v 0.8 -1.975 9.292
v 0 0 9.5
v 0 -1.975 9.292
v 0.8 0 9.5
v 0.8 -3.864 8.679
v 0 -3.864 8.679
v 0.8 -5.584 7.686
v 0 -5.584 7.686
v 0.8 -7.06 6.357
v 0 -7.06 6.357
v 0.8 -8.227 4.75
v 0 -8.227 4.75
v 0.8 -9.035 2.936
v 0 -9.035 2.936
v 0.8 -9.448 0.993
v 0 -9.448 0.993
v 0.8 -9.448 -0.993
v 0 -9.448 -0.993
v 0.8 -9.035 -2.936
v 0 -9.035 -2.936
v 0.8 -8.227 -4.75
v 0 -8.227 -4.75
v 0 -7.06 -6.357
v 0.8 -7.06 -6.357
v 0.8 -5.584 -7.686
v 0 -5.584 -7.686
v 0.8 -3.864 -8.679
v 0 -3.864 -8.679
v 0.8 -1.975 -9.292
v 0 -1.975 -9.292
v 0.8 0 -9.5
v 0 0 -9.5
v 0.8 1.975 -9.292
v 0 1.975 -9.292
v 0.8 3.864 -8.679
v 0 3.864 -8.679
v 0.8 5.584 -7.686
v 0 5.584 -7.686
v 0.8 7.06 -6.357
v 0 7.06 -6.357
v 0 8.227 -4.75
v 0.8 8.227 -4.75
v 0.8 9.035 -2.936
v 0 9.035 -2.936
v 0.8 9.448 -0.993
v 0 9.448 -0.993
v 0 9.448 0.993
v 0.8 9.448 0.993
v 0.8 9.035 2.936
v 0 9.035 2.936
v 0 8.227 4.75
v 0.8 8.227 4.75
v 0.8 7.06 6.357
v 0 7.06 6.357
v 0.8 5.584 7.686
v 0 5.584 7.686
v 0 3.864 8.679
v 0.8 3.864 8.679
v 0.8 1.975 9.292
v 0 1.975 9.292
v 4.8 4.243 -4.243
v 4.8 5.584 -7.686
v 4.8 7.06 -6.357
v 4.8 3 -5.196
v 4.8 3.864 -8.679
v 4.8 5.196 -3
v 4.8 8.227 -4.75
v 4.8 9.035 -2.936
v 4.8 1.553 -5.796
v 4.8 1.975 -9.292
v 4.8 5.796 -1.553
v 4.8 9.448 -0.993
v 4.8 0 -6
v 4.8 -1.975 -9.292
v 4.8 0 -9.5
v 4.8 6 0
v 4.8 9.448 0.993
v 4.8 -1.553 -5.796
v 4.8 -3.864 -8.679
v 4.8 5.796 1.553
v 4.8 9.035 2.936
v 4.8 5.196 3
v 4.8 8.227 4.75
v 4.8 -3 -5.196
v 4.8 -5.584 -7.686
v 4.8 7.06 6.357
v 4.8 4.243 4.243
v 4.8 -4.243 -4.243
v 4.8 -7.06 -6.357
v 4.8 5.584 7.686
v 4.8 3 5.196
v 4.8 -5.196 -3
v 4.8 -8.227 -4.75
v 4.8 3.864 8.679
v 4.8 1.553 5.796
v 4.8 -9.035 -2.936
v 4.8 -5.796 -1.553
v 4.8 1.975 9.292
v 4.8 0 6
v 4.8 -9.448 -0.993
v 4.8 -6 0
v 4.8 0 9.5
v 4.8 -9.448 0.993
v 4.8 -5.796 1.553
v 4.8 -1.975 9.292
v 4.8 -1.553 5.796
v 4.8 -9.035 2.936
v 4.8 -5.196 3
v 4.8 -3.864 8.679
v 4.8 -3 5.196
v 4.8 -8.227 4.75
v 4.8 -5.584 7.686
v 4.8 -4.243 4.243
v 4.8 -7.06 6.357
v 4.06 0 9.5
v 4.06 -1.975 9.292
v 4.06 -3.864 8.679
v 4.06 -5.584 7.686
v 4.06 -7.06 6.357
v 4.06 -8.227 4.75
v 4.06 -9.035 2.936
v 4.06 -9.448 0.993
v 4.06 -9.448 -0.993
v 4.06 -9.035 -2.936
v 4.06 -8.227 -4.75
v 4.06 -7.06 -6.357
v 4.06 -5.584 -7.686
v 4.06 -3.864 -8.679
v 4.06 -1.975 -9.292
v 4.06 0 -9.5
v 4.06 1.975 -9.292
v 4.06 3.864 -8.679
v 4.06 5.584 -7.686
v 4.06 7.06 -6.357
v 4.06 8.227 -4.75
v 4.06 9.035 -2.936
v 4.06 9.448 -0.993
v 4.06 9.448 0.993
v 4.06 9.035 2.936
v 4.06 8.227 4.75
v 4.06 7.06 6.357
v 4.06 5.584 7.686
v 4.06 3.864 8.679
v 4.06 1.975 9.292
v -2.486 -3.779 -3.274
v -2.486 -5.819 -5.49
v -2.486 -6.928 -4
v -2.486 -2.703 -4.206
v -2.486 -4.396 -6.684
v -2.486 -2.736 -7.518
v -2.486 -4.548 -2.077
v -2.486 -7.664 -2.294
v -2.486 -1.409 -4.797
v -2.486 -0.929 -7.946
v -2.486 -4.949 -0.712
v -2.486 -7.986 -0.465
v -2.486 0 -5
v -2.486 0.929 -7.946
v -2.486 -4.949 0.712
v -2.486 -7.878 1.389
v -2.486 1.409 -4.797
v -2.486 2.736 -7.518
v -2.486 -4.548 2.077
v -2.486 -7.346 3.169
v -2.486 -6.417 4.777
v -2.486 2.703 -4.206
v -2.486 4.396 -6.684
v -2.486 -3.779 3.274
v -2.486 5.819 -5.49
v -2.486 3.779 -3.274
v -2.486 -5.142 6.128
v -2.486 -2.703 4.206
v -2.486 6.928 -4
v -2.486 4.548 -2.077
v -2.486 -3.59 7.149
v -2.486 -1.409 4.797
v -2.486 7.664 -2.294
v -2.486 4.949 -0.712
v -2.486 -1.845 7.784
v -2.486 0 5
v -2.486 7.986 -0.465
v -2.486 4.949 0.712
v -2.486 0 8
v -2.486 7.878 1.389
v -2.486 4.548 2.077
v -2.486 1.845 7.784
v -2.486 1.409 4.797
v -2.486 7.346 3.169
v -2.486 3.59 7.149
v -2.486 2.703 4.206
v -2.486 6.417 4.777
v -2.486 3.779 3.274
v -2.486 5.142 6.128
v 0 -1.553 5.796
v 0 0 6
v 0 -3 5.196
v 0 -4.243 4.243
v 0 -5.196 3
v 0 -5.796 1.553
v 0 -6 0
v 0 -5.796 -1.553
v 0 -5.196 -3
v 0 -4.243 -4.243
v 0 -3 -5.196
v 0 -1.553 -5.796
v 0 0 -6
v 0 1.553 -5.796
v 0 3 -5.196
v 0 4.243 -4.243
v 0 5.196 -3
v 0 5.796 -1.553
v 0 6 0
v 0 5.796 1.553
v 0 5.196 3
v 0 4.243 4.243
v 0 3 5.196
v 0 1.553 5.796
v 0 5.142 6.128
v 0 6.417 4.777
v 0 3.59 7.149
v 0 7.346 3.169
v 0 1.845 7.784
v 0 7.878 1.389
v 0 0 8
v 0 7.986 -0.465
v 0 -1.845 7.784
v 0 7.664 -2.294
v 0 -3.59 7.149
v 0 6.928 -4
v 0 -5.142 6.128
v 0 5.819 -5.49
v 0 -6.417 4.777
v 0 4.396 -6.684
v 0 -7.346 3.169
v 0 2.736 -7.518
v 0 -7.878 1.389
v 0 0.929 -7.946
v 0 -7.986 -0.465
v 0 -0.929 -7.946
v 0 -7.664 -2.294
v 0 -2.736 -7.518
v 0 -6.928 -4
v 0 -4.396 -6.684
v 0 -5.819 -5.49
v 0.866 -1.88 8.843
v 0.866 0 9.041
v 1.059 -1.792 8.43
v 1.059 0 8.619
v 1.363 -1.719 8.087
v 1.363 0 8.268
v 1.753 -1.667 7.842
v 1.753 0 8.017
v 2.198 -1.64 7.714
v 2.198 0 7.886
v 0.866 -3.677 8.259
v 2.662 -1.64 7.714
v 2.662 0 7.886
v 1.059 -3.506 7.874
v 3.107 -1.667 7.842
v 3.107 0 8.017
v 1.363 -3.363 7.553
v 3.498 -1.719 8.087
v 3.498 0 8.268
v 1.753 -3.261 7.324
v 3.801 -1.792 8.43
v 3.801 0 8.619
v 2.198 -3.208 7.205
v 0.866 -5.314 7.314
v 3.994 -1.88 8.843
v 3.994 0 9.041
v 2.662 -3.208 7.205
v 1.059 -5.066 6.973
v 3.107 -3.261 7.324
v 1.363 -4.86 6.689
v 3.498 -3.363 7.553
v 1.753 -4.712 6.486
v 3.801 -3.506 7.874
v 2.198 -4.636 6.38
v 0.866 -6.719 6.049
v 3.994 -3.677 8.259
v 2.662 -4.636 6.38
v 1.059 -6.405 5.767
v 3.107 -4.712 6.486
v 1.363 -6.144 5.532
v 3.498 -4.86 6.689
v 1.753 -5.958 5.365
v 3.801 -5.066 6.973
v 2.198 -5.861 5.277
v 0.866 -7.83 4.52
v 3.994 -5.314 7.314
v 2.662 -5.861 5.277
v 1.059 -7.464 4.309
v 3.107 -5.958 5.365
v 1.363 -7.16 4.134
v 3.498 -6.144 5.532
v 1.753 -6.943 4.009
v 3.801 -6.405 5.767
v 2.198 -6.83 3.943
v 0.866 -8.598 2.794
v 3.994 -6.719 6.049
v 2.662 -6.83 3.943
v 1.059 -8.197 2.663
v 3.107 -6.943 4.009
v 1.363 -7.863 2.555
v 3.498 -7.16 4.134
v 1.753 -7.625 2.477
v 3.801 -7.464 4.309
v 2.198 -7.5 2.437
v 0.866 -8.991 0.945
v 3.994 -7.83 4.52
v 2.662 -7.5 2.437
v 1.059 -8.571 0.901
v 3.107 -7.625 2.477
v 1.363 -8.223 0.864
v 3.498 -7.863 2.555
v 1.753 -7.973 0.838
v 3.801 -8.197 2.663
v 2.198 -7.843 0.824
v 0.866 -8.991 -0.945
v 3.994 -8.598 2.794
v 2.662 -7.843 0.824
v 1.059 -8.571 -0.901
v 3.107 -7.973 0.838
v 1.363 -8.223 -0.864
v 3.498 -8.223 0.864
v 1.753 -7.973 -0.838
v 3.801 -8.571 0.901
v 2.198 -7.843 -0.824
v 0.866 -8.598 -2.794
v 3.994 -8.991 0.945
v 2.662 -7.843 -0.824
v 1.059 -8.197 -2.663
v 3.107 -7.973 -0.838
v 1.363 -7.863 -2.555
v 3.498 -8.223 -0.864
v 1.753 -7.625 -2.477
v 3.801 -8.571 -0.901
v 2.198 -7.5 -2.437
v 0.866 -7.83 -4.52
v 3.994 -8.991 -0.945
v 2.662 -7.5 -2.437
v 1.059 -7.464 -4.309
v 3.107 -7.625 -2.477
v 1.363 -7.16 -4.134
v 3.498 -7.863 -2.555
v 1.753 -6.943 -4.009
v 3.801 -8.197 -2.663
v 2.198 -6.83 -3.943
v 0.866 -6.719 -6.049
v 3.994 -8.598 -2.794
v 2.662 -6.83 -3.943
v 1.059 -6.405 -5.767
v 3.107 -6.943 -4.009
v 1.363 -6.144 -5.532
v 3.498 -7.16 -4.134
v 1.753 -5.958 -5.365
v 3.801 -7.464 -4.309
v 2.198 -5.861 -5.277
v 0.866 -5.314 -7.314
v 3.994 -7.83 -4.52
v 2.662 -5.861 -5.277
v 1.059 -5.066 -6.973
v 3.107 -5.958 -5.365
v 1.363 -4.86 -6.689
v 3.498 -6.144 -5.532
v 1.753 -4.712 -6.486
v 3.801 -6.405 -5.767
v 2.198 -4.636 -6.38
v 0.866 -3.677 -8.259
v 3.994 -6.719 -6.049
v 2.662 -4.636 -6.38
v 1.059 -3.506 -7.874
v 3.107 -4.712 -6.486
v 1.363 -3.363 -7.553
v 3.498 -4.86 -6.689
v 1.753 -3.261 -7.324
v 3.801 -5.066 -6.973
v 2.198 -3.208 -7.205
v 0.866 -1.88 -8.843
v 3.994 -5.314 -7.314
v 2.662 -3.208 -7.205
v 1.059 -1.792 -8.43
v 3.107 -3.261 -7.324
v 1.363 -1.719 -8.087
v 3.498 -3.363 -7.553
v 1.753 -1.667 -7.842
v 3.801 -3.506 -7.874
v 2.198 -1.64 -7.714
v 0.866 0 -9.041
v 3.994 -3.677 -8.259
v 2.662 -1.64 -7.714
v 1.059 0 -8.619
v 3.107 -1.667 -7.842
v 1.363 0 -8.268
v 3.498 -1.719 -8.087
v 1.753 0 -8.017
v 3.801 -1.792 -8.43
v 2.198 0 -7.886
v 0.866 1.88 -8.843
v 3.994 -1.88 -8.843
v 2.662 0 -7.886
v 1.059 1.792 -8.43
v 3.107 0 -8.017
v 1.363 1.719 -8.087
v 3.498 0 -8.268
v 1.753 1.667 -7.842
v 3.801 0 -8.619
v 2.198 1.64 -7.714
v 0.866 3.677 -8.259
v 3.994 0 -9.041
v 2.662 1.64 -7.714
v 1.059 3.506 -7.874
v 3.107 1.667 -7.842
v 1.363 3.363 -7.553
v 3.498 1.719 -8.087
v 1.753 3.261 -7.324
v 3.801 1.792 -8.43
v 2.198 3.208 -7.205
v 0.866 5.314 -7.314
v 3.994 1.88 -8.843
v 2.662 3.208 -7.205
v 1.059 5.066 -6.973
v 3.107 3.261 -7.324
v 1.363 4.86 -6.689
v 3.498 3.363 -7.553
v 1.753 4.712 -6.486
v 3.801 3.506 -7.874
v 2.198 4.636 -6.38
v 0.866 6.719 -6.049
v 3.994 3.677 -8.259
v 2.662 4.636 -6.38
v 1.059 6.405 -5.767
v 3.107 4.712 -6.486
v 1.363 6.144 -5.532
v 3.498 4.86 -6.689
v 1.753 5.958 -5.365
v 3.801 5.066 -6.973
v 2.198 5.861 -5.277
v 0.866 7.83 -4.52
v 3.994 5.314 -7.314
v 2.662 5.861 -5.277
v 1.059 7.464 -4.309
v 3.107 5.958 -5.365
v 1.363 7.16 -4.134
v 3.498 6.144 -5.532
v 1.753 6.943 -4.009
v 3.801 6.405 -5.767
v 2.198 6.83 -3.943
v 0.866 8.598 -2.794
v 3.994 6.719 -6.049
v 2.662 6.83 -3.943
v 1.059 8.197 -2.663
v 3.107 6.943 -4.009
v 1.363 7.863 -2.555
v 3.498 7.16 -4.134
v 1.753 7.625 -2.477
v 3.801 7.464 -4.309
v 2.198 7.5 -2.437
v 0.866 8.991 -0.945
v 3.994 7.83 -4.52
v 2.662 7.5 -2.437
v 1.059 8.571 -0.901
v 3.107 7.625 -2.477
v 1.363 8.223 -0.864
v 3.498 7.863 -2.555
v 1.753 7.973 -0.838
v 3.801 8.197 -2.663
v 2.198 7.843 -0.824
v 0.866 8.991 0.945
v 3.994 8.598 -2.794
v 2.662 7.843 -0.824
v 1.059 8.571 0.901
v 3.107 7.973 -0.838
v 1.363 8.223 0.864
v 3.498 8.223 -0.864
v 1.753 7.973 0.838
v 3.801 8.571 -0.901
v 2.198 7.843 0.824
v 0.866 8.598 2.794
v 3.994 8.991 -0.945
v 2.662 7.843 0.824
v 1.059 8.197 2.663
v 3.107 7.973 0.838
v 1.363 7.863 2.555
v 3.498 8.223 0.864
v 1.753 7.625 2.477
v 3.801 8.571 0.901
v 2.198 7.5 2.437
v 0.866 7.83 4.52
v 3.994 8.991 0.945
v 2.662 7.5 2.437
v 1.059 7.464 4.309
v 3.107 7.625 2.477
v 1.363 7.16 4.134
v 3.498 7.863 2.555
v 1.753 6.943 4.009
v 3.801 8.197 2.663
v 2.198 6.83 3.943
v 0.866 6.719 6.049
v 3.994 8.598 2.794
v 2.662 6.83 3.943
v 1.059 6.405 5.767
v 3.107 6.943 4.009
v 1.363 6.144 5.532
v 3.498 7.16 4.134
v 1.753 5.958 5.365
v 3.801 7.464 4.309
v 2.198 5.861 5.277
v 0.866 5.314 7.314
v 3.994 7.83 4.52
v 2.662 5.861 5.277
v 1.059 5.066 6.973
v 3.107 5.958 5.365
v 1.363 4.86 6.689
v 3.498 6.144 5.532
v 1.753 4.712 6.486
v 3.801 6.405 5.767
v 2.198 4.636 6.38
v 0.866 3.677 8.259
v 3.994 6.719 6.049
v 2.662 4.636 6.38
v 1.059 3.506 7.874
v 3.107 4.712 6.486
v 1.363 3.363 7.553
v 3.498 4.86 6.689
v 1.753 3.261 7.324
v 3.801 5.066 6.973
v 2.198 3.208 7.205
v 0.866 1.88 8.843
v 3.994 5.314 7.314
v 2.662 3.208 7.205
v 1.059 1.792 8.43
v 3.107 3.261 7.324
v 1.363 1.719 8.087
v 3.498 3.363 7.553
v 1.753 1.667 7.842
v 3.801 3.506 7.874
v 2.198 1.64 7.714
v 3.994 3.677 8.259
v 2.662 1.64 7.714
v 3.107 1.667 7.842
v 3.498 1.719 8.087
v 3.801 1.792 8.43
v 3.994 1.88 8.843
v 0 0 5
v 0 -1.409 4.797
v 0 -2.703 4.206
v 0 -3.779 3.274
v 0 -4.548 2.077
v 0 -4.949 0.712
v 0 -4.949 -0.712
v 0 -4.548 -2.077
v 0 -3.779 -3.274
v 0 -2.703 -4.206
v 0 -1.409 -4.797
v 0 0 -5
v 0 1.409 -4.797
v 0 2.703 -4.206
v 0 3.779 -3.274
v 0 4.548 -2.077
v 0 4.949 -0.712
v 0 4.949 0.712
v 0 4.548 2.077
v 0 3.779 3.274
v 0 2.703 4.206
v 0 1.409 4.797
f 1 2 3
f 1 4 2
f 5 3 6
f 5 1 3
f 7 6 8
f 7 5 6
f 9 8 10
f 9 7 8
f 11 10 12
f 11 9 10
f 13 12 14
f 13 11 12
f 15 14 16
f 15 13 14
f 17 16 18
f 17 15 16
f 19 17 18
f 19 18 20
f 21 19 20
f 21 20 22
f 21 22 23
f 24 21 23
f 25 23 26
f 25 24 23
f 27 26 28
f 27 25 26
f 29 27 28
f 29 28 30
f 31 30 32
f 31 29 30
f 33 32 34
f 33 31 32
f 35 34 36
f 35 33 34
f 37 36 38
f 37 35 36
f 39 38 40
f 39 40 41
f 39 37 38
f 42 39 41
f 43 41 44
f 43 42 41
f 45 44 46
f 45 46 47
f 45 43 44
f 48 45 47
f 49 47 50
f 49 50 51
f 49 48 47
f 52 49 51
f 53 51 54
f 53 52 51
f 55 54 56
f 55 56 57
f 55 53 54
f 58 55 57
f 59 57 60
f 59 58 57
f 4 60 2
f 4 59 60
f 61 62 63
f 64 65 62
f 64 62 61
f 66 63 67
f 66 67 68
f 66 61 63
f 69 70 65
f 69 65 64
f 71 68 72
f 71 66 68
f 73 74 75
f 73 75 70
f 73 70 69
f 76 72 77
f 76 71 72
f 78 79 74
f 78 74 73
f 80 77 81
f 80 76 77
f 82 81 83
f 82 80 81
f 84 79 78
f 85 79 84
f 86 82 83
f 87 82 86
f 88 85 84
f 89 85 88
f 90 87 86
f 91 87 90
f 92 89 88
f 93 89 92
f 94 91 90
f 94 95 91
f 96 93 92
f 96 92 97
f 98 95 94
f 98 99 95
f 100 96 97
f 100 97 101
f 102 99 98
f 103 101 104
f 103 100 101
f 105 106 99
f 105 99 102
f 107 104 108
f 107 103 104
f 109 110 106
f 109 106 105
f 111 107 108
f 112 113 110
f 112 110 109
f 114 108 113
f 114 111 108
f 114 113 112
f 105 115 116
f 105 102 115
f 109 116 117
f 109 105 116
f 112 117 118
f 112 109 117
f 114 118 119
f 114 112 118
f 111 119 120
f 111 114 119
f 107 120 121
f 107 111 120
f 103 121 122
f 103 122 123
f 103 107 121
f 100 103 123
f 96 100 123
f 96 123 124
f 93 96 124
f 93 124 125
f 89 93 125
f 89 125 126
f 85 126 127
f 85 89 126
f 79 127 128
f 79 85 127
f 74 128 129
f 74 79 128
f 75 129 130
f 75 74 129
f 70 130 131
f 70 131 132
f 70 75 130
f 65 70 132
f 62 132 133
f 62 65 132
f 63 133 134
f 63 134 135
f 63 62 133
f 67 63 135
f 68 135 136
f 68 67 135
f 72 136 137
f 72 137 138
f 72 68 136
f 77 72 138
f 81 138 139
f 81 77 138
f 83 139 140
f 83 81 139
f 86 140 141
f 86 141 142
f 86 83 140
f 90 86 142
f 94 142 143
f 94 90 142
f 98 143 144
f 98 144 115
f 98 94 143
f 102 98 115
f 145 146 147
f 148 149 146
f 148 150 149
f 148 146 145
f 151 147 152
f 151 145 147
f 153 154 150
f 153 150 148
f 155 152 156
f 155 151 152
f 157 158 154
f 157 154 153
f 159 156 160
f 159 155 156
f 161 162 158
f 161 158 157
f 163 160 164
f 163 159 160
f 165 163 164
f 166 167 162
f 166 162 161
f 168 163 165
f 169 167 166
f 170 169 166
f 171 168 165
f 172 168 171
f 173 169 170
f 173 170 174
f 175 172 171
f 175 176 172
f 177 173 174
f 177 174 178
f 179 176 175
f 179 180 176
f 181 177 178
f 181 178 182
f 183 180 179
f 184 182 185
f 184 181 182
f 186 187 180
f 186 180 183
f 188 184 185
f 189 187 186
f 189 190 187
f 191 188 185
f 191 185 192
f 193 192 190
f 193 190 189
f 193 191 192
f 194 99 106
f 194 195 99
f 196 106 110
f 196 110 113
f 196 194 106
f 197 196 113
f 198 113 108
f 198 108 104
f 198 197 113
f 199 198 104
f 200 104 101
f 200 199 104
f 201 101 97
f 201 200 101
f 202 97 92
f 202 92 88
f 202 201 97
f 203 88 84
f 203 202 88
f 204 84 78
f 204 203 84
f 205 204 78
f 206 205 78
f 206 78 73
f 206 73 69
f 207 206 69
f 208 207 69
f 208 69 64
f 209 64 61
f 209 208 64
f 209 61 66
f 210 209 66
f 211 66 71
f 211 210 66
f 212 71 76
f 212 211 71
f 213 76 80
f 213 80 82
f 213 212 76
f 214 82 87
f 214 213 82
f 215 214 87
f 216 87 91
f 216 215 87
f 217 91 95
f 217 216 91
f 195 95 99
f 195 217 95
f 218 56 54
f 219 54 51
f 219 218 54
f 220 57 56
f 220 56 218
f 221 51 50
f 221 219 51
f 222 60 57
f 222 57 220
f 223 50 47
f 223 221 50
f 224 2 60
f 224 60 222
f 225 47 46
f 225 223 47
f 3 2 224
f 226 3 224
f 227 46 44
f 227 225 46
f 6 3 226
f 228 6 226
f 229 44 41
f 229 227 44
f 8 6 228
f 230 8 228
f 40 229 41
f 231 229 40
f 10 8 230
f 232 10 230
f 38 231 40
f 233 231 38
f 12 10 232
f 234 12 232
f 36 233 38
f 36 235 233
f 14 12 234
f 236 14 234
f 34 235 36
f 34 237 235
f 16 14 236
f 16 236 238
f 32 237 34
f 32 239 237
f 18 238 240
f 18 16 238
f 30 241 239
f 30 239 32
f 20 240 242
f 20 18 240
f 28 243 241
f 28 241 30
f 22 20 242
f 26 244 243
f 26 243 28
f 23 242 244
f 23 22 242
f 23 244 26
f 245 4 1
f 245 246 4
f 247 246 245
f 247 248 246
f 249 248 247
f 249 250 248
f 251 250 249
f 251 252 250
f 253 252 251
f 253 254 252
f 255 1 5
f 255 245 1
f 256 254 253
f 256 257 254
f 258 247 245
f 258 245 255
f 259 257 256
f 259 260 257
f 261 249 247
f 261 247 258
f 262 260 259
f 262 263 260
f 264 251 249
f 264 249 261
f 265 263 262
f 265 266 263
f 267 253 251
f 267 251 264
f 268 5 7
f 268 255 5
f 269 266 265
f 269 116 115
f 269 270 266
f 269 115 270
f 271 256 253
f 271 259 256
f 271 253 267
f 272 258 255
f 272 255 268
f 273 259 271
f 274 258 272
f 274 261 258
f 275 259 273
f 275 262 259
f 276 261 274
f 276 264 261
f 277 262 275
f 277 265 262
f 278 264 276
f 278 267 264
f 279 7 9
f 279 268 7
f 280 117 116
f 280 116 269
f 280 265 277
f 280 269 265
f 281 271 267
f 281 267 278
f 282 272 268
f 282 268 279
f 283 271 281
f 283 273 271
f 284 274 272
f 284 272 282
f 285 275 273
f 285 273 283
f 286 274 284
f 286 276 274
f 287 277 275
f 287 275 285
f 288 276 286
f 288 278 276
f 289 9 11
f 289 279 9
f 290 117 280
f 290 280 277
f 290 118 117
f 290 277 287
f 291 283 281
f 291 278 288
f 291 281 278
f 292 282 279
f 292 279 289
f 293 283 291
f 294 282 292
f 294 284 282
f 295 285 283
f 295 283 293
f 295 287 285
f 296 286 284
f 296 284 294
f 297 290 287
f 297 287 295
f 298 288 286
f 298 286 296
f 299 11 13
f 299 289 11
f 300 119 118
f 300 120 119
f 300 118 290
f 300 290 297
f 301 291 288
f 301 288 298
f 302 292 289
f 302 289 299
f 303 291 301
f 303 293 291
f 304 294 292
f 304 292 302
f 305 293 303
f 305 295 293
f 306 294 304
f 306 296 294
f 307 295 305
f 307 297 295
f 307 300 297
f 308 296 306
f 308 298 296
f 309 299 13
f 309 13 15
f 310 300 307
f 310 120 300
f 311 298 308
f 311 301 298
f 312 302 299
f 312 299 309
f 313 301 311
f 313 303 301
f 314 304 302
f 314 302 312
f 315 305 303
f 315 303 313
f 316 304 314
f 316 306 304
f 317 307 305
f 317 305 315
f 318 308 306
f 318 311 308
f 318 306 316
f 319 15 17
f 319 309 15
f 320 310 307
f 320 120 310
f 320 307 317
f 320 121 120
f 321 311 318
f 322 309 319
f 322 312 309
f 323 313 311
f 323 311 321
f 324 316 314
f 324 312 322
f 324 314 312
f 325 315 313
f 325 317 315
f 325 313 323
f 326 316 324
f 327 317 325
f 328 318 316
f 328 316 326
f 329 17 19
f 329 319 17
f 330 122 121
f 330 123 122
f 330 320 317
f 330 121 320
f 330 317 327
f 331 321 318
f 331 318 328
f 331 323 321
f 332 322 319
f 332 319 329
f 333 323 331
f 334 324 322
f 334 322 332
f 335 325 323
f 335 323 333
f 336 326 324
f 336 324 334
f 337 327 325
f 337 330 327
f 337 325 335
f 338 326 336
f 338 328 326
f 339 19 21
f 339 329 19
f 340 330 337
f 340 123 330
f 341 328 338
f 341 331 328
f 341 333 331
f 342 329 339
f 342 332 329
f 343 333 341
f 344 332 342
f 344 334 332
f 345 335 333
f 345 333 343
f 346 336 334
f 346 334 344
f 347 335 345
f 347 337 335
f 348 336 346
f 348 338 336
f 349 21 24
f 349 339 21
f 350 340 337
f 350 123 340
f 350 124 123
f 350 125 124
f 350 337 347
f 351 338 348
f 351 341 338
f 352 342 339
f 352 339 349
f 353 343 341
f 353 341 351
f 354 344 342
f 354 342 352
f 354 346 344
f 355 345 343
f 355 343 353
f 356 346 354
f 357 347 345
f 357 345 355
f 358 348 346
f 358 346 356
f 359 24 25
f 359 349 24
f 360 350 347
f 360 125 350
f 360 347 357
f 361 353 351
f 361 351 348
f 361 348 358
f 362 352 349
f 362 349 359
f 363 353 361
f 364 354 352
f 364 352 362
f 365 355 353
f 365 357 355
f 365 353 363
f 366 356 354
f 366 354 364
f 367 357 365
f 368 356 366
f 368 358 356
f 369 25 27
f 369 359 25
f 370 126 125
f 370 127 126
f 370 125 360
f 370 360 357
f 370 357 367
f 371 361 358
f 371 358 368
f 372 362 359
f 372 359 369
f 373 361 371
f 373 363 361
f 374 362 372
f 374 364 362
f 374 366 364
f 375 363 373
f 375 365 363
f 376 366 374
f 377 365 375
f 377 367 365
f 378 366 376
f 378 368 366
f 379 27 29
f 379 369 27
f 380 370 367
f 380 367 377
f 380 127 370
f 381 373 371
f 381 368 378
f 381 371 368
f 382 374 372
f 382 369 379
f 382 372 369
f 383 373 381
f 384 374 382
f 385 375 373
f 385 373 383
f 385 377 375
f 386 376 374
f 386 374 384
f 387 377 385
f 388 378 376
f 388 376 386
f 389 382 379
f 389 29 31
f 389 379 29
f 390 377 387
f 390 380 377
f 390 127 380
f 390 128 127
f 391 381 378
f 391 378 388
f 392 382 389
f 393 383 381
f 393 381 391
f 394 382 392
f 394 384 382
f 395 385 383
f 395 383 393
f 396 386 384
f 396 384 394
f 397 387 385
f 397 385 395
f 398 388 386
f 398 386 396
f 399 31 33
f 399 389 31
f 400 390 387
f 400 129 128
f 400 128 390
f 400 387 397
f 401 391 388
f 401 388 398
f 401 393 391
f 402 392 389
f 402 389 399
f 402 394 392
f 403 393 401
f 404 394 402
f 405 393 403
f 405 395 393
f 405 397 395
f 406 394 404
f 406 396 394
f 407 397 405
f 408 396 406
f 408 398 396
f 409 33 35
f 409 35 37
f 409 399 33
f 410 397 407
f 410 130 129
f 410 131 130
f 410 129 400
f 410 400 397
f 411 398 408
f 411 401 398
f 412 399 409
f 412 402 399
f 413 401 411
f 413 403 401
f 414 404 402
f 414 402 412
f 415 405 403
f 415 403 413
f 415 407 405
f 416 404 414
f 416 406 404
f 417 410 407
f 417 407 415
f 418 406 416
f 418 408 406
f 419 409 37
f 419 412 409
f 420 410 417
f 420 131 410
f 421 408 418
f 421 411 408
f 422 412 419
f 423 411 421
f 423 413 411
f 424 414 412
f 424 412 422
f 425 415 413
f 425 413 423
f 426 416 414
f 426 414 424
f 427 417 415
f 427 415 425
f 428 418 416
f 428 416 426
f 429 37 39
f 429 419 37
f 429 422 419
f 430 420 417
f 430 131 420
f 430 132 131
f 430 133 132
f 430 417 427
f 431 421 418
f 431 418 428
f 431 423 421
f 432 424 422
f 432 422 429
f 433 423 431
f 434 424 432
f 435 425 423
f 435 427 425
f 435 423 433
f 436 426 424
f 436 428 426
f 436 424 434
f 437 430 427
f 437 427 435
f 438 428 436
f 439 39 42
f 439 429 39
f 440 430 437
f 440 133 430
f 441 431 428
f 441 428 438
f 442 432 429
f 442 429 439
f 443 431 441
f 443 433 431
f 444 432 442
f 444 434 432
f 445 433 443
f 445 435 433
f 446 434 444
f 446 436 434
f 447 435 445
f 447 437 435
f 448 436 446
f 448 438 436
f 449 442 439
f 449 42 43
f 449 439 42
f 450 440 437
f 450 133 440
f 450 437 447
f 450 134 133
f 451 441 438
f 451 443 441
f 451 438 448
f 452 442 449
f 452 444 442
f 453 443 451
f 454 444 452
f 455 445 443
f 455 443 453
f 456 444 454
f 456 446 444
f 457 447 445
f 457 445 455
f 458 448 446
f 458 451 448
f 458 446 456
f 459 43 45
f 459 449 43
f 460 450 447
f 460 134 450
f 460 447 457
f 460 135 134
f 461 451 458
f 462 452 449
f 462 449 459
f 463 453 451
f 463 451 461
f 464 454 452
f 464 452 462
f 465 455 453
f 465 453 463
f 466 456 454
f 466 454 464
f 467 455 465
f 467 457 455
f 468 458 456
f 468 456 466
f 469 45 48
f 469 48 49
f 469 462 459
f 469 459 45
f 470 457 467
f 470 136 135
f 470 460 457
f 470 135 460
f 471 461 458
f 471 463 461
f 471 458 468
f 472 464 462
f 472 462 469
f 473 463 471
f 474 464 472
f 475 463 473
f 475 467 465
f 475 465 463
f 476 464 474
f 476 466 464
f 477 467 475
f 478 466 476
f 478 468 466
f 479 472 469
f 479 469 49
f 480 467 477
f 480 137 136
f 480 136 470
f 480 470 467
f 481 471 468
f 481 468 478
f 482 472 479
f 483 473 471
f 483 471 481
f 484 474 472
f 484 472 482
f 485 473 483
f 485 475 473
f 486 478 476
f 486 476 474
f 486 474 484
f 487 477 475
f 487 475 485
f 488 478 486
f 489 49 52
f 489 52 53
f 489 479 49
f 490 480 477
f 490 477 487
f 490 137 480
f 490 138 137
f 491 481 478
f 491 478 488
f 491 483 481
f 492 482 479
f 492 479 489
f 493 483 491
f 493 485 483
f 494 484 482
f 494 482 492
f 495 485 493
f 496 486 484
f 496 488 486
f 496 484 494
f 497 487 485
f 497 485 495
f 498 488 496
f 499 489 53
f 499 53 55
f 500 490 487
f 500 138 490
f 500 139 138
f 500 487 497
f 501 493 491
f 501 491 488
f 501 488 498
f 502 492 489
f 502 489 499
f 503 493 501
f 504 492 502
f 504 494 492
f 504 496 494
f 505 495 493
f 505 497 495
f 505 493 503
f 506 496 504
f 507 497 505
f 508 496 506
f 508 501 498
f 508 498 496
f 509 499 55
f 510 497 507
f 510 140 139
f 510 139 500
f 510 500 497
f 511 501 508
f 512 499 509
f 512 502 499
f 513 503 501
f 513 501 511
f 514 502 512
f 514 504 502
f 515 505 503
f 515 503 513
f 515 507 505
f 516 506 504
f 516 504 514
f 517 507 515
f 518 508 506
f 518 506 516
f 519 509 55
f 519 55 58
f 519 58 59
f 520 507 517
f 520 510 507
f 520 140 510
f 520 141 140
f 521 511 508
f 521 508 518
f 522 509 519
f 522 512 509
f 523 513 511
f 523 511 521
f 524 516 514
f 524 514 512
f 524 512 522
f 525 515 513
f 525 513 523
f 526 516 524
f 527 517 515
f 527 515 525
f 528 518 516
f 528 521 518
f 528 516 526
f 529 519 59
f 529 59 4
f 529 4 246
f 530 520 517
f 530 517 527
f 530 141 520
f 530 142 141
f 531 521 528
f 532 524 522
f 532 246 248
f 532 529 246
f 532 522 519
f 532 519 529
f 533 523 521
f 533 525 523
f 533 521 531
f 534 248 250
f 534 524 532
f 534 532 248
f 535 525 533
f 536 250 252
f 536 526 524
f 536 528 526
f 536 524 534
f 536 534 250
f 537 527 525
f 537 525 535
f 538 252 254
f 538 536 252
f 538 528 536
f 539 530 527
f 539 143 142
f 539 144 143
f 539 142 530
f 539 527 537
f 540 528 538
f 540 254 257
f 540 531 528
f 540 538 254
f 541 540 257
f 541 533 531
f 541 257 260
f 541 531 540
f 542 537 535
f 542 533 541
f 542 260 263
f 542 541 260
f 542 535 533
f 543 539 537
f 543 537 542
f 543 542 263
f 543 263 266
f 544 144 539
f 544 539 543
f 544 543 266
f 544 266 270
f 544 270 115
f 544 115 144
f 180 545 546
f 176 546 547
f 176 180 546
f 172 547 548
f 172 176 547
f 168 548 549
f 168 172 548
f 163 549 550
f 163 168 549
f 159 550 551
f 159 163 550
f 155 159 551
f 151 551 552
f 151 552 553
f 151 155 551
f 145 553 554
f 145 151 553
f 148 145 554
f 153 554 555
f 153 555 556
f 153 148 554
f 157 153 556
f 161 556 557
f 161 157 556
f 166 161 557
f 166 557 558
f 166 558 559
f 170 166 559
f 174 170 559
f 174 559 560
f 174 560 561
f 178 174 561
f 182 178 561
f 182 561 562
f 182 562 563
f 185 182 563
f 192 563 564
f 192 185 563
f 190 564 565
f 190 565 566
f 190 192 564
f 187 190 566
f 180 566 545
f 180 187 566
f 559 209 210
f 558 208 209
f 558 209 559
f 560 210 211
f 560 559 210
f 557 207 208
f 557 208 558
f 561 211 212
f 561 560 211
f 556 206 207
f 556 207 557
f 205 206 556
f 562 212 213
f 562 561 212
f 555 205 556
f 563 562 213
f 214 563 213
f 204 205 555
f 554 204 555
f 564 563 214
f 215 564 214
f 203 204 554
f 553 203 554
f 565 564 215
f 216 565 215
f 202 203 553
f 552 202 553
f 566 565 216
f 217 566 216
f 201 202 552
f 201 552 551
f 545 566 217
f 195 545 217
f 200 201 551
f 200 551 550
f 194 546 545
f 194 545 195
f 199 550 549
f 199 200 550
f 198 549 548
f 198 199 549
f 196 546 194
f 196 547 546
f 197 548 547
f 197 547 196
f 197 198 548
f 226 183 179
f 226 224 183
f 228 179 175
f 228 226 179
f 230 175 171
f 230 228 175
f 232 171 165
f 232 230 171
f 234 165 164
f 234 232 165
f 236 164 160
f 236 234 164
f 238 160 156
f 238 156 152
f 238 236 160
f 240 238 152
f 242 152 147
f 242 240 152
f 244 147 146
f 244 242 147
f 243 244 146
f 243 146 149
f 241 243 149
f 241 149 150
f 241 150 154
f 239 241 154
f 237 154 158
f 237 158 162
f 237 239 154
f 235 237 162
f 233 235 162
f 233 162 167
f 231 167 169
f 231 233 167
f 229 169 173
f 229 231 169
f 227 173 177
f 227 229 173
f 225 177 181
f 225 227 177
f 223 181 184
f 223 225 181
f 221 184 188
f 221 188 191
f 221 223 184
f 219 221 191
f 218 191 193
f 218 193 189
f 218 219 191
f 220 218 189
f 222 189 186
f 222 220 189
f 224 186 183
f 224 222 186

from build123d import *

# Parameters (mm, degrees)
SKETCH_2_R          = 8.712878419
CUT_EXTRUDE_1_DEPTH = 0.7


with BuildPart() as part:
    # 草图1 → 旋转1 (revolve)
    with BuildSketch(Plane.XY, mode=Mode.PRIVATE) as revolve_1_sk:
        with BuildLine():
            Line((0, -9.5), (0.8, -9.5))
            ThreePointArc((0.8, -9.5), (2.430127754, -7.869872246), (4.060255508, -9.5))
            Line((4.060255508, -9.5), (4.8, -9.5))
            Line((4.8, -9.5), (4.8, -6))
            Line((4.8, -6), (0, -6))
            Line((0, -6), (0, -5))
            Line((0, -5), (-3.185969682, -5))
            Line((-3.185969682, -5), (-3.185969682, -8))
            Line((-3.185969682, -8), (0, -8))
            Line((0, -8), (0, -9.5))
        make_face()
    revolve(revolve_1_sk.sketch.rotate(Axis((-3.185969682, 0, 0), (1, 0, 0)), 270), axis=Axis((-3.185969682, 0, 0), (1, 0, 0)))

    # 草图2 → 切除-拉伸1 (cut)
    with BuildSketch(Plane.ZY.offset(3.185969682)):
        Circle(SKETCH_2_R)
    extrude(amount=-CUT_EXTRUDE_1_DEPTH, mode=Mode.SUBTRACT)


solid = part.part
